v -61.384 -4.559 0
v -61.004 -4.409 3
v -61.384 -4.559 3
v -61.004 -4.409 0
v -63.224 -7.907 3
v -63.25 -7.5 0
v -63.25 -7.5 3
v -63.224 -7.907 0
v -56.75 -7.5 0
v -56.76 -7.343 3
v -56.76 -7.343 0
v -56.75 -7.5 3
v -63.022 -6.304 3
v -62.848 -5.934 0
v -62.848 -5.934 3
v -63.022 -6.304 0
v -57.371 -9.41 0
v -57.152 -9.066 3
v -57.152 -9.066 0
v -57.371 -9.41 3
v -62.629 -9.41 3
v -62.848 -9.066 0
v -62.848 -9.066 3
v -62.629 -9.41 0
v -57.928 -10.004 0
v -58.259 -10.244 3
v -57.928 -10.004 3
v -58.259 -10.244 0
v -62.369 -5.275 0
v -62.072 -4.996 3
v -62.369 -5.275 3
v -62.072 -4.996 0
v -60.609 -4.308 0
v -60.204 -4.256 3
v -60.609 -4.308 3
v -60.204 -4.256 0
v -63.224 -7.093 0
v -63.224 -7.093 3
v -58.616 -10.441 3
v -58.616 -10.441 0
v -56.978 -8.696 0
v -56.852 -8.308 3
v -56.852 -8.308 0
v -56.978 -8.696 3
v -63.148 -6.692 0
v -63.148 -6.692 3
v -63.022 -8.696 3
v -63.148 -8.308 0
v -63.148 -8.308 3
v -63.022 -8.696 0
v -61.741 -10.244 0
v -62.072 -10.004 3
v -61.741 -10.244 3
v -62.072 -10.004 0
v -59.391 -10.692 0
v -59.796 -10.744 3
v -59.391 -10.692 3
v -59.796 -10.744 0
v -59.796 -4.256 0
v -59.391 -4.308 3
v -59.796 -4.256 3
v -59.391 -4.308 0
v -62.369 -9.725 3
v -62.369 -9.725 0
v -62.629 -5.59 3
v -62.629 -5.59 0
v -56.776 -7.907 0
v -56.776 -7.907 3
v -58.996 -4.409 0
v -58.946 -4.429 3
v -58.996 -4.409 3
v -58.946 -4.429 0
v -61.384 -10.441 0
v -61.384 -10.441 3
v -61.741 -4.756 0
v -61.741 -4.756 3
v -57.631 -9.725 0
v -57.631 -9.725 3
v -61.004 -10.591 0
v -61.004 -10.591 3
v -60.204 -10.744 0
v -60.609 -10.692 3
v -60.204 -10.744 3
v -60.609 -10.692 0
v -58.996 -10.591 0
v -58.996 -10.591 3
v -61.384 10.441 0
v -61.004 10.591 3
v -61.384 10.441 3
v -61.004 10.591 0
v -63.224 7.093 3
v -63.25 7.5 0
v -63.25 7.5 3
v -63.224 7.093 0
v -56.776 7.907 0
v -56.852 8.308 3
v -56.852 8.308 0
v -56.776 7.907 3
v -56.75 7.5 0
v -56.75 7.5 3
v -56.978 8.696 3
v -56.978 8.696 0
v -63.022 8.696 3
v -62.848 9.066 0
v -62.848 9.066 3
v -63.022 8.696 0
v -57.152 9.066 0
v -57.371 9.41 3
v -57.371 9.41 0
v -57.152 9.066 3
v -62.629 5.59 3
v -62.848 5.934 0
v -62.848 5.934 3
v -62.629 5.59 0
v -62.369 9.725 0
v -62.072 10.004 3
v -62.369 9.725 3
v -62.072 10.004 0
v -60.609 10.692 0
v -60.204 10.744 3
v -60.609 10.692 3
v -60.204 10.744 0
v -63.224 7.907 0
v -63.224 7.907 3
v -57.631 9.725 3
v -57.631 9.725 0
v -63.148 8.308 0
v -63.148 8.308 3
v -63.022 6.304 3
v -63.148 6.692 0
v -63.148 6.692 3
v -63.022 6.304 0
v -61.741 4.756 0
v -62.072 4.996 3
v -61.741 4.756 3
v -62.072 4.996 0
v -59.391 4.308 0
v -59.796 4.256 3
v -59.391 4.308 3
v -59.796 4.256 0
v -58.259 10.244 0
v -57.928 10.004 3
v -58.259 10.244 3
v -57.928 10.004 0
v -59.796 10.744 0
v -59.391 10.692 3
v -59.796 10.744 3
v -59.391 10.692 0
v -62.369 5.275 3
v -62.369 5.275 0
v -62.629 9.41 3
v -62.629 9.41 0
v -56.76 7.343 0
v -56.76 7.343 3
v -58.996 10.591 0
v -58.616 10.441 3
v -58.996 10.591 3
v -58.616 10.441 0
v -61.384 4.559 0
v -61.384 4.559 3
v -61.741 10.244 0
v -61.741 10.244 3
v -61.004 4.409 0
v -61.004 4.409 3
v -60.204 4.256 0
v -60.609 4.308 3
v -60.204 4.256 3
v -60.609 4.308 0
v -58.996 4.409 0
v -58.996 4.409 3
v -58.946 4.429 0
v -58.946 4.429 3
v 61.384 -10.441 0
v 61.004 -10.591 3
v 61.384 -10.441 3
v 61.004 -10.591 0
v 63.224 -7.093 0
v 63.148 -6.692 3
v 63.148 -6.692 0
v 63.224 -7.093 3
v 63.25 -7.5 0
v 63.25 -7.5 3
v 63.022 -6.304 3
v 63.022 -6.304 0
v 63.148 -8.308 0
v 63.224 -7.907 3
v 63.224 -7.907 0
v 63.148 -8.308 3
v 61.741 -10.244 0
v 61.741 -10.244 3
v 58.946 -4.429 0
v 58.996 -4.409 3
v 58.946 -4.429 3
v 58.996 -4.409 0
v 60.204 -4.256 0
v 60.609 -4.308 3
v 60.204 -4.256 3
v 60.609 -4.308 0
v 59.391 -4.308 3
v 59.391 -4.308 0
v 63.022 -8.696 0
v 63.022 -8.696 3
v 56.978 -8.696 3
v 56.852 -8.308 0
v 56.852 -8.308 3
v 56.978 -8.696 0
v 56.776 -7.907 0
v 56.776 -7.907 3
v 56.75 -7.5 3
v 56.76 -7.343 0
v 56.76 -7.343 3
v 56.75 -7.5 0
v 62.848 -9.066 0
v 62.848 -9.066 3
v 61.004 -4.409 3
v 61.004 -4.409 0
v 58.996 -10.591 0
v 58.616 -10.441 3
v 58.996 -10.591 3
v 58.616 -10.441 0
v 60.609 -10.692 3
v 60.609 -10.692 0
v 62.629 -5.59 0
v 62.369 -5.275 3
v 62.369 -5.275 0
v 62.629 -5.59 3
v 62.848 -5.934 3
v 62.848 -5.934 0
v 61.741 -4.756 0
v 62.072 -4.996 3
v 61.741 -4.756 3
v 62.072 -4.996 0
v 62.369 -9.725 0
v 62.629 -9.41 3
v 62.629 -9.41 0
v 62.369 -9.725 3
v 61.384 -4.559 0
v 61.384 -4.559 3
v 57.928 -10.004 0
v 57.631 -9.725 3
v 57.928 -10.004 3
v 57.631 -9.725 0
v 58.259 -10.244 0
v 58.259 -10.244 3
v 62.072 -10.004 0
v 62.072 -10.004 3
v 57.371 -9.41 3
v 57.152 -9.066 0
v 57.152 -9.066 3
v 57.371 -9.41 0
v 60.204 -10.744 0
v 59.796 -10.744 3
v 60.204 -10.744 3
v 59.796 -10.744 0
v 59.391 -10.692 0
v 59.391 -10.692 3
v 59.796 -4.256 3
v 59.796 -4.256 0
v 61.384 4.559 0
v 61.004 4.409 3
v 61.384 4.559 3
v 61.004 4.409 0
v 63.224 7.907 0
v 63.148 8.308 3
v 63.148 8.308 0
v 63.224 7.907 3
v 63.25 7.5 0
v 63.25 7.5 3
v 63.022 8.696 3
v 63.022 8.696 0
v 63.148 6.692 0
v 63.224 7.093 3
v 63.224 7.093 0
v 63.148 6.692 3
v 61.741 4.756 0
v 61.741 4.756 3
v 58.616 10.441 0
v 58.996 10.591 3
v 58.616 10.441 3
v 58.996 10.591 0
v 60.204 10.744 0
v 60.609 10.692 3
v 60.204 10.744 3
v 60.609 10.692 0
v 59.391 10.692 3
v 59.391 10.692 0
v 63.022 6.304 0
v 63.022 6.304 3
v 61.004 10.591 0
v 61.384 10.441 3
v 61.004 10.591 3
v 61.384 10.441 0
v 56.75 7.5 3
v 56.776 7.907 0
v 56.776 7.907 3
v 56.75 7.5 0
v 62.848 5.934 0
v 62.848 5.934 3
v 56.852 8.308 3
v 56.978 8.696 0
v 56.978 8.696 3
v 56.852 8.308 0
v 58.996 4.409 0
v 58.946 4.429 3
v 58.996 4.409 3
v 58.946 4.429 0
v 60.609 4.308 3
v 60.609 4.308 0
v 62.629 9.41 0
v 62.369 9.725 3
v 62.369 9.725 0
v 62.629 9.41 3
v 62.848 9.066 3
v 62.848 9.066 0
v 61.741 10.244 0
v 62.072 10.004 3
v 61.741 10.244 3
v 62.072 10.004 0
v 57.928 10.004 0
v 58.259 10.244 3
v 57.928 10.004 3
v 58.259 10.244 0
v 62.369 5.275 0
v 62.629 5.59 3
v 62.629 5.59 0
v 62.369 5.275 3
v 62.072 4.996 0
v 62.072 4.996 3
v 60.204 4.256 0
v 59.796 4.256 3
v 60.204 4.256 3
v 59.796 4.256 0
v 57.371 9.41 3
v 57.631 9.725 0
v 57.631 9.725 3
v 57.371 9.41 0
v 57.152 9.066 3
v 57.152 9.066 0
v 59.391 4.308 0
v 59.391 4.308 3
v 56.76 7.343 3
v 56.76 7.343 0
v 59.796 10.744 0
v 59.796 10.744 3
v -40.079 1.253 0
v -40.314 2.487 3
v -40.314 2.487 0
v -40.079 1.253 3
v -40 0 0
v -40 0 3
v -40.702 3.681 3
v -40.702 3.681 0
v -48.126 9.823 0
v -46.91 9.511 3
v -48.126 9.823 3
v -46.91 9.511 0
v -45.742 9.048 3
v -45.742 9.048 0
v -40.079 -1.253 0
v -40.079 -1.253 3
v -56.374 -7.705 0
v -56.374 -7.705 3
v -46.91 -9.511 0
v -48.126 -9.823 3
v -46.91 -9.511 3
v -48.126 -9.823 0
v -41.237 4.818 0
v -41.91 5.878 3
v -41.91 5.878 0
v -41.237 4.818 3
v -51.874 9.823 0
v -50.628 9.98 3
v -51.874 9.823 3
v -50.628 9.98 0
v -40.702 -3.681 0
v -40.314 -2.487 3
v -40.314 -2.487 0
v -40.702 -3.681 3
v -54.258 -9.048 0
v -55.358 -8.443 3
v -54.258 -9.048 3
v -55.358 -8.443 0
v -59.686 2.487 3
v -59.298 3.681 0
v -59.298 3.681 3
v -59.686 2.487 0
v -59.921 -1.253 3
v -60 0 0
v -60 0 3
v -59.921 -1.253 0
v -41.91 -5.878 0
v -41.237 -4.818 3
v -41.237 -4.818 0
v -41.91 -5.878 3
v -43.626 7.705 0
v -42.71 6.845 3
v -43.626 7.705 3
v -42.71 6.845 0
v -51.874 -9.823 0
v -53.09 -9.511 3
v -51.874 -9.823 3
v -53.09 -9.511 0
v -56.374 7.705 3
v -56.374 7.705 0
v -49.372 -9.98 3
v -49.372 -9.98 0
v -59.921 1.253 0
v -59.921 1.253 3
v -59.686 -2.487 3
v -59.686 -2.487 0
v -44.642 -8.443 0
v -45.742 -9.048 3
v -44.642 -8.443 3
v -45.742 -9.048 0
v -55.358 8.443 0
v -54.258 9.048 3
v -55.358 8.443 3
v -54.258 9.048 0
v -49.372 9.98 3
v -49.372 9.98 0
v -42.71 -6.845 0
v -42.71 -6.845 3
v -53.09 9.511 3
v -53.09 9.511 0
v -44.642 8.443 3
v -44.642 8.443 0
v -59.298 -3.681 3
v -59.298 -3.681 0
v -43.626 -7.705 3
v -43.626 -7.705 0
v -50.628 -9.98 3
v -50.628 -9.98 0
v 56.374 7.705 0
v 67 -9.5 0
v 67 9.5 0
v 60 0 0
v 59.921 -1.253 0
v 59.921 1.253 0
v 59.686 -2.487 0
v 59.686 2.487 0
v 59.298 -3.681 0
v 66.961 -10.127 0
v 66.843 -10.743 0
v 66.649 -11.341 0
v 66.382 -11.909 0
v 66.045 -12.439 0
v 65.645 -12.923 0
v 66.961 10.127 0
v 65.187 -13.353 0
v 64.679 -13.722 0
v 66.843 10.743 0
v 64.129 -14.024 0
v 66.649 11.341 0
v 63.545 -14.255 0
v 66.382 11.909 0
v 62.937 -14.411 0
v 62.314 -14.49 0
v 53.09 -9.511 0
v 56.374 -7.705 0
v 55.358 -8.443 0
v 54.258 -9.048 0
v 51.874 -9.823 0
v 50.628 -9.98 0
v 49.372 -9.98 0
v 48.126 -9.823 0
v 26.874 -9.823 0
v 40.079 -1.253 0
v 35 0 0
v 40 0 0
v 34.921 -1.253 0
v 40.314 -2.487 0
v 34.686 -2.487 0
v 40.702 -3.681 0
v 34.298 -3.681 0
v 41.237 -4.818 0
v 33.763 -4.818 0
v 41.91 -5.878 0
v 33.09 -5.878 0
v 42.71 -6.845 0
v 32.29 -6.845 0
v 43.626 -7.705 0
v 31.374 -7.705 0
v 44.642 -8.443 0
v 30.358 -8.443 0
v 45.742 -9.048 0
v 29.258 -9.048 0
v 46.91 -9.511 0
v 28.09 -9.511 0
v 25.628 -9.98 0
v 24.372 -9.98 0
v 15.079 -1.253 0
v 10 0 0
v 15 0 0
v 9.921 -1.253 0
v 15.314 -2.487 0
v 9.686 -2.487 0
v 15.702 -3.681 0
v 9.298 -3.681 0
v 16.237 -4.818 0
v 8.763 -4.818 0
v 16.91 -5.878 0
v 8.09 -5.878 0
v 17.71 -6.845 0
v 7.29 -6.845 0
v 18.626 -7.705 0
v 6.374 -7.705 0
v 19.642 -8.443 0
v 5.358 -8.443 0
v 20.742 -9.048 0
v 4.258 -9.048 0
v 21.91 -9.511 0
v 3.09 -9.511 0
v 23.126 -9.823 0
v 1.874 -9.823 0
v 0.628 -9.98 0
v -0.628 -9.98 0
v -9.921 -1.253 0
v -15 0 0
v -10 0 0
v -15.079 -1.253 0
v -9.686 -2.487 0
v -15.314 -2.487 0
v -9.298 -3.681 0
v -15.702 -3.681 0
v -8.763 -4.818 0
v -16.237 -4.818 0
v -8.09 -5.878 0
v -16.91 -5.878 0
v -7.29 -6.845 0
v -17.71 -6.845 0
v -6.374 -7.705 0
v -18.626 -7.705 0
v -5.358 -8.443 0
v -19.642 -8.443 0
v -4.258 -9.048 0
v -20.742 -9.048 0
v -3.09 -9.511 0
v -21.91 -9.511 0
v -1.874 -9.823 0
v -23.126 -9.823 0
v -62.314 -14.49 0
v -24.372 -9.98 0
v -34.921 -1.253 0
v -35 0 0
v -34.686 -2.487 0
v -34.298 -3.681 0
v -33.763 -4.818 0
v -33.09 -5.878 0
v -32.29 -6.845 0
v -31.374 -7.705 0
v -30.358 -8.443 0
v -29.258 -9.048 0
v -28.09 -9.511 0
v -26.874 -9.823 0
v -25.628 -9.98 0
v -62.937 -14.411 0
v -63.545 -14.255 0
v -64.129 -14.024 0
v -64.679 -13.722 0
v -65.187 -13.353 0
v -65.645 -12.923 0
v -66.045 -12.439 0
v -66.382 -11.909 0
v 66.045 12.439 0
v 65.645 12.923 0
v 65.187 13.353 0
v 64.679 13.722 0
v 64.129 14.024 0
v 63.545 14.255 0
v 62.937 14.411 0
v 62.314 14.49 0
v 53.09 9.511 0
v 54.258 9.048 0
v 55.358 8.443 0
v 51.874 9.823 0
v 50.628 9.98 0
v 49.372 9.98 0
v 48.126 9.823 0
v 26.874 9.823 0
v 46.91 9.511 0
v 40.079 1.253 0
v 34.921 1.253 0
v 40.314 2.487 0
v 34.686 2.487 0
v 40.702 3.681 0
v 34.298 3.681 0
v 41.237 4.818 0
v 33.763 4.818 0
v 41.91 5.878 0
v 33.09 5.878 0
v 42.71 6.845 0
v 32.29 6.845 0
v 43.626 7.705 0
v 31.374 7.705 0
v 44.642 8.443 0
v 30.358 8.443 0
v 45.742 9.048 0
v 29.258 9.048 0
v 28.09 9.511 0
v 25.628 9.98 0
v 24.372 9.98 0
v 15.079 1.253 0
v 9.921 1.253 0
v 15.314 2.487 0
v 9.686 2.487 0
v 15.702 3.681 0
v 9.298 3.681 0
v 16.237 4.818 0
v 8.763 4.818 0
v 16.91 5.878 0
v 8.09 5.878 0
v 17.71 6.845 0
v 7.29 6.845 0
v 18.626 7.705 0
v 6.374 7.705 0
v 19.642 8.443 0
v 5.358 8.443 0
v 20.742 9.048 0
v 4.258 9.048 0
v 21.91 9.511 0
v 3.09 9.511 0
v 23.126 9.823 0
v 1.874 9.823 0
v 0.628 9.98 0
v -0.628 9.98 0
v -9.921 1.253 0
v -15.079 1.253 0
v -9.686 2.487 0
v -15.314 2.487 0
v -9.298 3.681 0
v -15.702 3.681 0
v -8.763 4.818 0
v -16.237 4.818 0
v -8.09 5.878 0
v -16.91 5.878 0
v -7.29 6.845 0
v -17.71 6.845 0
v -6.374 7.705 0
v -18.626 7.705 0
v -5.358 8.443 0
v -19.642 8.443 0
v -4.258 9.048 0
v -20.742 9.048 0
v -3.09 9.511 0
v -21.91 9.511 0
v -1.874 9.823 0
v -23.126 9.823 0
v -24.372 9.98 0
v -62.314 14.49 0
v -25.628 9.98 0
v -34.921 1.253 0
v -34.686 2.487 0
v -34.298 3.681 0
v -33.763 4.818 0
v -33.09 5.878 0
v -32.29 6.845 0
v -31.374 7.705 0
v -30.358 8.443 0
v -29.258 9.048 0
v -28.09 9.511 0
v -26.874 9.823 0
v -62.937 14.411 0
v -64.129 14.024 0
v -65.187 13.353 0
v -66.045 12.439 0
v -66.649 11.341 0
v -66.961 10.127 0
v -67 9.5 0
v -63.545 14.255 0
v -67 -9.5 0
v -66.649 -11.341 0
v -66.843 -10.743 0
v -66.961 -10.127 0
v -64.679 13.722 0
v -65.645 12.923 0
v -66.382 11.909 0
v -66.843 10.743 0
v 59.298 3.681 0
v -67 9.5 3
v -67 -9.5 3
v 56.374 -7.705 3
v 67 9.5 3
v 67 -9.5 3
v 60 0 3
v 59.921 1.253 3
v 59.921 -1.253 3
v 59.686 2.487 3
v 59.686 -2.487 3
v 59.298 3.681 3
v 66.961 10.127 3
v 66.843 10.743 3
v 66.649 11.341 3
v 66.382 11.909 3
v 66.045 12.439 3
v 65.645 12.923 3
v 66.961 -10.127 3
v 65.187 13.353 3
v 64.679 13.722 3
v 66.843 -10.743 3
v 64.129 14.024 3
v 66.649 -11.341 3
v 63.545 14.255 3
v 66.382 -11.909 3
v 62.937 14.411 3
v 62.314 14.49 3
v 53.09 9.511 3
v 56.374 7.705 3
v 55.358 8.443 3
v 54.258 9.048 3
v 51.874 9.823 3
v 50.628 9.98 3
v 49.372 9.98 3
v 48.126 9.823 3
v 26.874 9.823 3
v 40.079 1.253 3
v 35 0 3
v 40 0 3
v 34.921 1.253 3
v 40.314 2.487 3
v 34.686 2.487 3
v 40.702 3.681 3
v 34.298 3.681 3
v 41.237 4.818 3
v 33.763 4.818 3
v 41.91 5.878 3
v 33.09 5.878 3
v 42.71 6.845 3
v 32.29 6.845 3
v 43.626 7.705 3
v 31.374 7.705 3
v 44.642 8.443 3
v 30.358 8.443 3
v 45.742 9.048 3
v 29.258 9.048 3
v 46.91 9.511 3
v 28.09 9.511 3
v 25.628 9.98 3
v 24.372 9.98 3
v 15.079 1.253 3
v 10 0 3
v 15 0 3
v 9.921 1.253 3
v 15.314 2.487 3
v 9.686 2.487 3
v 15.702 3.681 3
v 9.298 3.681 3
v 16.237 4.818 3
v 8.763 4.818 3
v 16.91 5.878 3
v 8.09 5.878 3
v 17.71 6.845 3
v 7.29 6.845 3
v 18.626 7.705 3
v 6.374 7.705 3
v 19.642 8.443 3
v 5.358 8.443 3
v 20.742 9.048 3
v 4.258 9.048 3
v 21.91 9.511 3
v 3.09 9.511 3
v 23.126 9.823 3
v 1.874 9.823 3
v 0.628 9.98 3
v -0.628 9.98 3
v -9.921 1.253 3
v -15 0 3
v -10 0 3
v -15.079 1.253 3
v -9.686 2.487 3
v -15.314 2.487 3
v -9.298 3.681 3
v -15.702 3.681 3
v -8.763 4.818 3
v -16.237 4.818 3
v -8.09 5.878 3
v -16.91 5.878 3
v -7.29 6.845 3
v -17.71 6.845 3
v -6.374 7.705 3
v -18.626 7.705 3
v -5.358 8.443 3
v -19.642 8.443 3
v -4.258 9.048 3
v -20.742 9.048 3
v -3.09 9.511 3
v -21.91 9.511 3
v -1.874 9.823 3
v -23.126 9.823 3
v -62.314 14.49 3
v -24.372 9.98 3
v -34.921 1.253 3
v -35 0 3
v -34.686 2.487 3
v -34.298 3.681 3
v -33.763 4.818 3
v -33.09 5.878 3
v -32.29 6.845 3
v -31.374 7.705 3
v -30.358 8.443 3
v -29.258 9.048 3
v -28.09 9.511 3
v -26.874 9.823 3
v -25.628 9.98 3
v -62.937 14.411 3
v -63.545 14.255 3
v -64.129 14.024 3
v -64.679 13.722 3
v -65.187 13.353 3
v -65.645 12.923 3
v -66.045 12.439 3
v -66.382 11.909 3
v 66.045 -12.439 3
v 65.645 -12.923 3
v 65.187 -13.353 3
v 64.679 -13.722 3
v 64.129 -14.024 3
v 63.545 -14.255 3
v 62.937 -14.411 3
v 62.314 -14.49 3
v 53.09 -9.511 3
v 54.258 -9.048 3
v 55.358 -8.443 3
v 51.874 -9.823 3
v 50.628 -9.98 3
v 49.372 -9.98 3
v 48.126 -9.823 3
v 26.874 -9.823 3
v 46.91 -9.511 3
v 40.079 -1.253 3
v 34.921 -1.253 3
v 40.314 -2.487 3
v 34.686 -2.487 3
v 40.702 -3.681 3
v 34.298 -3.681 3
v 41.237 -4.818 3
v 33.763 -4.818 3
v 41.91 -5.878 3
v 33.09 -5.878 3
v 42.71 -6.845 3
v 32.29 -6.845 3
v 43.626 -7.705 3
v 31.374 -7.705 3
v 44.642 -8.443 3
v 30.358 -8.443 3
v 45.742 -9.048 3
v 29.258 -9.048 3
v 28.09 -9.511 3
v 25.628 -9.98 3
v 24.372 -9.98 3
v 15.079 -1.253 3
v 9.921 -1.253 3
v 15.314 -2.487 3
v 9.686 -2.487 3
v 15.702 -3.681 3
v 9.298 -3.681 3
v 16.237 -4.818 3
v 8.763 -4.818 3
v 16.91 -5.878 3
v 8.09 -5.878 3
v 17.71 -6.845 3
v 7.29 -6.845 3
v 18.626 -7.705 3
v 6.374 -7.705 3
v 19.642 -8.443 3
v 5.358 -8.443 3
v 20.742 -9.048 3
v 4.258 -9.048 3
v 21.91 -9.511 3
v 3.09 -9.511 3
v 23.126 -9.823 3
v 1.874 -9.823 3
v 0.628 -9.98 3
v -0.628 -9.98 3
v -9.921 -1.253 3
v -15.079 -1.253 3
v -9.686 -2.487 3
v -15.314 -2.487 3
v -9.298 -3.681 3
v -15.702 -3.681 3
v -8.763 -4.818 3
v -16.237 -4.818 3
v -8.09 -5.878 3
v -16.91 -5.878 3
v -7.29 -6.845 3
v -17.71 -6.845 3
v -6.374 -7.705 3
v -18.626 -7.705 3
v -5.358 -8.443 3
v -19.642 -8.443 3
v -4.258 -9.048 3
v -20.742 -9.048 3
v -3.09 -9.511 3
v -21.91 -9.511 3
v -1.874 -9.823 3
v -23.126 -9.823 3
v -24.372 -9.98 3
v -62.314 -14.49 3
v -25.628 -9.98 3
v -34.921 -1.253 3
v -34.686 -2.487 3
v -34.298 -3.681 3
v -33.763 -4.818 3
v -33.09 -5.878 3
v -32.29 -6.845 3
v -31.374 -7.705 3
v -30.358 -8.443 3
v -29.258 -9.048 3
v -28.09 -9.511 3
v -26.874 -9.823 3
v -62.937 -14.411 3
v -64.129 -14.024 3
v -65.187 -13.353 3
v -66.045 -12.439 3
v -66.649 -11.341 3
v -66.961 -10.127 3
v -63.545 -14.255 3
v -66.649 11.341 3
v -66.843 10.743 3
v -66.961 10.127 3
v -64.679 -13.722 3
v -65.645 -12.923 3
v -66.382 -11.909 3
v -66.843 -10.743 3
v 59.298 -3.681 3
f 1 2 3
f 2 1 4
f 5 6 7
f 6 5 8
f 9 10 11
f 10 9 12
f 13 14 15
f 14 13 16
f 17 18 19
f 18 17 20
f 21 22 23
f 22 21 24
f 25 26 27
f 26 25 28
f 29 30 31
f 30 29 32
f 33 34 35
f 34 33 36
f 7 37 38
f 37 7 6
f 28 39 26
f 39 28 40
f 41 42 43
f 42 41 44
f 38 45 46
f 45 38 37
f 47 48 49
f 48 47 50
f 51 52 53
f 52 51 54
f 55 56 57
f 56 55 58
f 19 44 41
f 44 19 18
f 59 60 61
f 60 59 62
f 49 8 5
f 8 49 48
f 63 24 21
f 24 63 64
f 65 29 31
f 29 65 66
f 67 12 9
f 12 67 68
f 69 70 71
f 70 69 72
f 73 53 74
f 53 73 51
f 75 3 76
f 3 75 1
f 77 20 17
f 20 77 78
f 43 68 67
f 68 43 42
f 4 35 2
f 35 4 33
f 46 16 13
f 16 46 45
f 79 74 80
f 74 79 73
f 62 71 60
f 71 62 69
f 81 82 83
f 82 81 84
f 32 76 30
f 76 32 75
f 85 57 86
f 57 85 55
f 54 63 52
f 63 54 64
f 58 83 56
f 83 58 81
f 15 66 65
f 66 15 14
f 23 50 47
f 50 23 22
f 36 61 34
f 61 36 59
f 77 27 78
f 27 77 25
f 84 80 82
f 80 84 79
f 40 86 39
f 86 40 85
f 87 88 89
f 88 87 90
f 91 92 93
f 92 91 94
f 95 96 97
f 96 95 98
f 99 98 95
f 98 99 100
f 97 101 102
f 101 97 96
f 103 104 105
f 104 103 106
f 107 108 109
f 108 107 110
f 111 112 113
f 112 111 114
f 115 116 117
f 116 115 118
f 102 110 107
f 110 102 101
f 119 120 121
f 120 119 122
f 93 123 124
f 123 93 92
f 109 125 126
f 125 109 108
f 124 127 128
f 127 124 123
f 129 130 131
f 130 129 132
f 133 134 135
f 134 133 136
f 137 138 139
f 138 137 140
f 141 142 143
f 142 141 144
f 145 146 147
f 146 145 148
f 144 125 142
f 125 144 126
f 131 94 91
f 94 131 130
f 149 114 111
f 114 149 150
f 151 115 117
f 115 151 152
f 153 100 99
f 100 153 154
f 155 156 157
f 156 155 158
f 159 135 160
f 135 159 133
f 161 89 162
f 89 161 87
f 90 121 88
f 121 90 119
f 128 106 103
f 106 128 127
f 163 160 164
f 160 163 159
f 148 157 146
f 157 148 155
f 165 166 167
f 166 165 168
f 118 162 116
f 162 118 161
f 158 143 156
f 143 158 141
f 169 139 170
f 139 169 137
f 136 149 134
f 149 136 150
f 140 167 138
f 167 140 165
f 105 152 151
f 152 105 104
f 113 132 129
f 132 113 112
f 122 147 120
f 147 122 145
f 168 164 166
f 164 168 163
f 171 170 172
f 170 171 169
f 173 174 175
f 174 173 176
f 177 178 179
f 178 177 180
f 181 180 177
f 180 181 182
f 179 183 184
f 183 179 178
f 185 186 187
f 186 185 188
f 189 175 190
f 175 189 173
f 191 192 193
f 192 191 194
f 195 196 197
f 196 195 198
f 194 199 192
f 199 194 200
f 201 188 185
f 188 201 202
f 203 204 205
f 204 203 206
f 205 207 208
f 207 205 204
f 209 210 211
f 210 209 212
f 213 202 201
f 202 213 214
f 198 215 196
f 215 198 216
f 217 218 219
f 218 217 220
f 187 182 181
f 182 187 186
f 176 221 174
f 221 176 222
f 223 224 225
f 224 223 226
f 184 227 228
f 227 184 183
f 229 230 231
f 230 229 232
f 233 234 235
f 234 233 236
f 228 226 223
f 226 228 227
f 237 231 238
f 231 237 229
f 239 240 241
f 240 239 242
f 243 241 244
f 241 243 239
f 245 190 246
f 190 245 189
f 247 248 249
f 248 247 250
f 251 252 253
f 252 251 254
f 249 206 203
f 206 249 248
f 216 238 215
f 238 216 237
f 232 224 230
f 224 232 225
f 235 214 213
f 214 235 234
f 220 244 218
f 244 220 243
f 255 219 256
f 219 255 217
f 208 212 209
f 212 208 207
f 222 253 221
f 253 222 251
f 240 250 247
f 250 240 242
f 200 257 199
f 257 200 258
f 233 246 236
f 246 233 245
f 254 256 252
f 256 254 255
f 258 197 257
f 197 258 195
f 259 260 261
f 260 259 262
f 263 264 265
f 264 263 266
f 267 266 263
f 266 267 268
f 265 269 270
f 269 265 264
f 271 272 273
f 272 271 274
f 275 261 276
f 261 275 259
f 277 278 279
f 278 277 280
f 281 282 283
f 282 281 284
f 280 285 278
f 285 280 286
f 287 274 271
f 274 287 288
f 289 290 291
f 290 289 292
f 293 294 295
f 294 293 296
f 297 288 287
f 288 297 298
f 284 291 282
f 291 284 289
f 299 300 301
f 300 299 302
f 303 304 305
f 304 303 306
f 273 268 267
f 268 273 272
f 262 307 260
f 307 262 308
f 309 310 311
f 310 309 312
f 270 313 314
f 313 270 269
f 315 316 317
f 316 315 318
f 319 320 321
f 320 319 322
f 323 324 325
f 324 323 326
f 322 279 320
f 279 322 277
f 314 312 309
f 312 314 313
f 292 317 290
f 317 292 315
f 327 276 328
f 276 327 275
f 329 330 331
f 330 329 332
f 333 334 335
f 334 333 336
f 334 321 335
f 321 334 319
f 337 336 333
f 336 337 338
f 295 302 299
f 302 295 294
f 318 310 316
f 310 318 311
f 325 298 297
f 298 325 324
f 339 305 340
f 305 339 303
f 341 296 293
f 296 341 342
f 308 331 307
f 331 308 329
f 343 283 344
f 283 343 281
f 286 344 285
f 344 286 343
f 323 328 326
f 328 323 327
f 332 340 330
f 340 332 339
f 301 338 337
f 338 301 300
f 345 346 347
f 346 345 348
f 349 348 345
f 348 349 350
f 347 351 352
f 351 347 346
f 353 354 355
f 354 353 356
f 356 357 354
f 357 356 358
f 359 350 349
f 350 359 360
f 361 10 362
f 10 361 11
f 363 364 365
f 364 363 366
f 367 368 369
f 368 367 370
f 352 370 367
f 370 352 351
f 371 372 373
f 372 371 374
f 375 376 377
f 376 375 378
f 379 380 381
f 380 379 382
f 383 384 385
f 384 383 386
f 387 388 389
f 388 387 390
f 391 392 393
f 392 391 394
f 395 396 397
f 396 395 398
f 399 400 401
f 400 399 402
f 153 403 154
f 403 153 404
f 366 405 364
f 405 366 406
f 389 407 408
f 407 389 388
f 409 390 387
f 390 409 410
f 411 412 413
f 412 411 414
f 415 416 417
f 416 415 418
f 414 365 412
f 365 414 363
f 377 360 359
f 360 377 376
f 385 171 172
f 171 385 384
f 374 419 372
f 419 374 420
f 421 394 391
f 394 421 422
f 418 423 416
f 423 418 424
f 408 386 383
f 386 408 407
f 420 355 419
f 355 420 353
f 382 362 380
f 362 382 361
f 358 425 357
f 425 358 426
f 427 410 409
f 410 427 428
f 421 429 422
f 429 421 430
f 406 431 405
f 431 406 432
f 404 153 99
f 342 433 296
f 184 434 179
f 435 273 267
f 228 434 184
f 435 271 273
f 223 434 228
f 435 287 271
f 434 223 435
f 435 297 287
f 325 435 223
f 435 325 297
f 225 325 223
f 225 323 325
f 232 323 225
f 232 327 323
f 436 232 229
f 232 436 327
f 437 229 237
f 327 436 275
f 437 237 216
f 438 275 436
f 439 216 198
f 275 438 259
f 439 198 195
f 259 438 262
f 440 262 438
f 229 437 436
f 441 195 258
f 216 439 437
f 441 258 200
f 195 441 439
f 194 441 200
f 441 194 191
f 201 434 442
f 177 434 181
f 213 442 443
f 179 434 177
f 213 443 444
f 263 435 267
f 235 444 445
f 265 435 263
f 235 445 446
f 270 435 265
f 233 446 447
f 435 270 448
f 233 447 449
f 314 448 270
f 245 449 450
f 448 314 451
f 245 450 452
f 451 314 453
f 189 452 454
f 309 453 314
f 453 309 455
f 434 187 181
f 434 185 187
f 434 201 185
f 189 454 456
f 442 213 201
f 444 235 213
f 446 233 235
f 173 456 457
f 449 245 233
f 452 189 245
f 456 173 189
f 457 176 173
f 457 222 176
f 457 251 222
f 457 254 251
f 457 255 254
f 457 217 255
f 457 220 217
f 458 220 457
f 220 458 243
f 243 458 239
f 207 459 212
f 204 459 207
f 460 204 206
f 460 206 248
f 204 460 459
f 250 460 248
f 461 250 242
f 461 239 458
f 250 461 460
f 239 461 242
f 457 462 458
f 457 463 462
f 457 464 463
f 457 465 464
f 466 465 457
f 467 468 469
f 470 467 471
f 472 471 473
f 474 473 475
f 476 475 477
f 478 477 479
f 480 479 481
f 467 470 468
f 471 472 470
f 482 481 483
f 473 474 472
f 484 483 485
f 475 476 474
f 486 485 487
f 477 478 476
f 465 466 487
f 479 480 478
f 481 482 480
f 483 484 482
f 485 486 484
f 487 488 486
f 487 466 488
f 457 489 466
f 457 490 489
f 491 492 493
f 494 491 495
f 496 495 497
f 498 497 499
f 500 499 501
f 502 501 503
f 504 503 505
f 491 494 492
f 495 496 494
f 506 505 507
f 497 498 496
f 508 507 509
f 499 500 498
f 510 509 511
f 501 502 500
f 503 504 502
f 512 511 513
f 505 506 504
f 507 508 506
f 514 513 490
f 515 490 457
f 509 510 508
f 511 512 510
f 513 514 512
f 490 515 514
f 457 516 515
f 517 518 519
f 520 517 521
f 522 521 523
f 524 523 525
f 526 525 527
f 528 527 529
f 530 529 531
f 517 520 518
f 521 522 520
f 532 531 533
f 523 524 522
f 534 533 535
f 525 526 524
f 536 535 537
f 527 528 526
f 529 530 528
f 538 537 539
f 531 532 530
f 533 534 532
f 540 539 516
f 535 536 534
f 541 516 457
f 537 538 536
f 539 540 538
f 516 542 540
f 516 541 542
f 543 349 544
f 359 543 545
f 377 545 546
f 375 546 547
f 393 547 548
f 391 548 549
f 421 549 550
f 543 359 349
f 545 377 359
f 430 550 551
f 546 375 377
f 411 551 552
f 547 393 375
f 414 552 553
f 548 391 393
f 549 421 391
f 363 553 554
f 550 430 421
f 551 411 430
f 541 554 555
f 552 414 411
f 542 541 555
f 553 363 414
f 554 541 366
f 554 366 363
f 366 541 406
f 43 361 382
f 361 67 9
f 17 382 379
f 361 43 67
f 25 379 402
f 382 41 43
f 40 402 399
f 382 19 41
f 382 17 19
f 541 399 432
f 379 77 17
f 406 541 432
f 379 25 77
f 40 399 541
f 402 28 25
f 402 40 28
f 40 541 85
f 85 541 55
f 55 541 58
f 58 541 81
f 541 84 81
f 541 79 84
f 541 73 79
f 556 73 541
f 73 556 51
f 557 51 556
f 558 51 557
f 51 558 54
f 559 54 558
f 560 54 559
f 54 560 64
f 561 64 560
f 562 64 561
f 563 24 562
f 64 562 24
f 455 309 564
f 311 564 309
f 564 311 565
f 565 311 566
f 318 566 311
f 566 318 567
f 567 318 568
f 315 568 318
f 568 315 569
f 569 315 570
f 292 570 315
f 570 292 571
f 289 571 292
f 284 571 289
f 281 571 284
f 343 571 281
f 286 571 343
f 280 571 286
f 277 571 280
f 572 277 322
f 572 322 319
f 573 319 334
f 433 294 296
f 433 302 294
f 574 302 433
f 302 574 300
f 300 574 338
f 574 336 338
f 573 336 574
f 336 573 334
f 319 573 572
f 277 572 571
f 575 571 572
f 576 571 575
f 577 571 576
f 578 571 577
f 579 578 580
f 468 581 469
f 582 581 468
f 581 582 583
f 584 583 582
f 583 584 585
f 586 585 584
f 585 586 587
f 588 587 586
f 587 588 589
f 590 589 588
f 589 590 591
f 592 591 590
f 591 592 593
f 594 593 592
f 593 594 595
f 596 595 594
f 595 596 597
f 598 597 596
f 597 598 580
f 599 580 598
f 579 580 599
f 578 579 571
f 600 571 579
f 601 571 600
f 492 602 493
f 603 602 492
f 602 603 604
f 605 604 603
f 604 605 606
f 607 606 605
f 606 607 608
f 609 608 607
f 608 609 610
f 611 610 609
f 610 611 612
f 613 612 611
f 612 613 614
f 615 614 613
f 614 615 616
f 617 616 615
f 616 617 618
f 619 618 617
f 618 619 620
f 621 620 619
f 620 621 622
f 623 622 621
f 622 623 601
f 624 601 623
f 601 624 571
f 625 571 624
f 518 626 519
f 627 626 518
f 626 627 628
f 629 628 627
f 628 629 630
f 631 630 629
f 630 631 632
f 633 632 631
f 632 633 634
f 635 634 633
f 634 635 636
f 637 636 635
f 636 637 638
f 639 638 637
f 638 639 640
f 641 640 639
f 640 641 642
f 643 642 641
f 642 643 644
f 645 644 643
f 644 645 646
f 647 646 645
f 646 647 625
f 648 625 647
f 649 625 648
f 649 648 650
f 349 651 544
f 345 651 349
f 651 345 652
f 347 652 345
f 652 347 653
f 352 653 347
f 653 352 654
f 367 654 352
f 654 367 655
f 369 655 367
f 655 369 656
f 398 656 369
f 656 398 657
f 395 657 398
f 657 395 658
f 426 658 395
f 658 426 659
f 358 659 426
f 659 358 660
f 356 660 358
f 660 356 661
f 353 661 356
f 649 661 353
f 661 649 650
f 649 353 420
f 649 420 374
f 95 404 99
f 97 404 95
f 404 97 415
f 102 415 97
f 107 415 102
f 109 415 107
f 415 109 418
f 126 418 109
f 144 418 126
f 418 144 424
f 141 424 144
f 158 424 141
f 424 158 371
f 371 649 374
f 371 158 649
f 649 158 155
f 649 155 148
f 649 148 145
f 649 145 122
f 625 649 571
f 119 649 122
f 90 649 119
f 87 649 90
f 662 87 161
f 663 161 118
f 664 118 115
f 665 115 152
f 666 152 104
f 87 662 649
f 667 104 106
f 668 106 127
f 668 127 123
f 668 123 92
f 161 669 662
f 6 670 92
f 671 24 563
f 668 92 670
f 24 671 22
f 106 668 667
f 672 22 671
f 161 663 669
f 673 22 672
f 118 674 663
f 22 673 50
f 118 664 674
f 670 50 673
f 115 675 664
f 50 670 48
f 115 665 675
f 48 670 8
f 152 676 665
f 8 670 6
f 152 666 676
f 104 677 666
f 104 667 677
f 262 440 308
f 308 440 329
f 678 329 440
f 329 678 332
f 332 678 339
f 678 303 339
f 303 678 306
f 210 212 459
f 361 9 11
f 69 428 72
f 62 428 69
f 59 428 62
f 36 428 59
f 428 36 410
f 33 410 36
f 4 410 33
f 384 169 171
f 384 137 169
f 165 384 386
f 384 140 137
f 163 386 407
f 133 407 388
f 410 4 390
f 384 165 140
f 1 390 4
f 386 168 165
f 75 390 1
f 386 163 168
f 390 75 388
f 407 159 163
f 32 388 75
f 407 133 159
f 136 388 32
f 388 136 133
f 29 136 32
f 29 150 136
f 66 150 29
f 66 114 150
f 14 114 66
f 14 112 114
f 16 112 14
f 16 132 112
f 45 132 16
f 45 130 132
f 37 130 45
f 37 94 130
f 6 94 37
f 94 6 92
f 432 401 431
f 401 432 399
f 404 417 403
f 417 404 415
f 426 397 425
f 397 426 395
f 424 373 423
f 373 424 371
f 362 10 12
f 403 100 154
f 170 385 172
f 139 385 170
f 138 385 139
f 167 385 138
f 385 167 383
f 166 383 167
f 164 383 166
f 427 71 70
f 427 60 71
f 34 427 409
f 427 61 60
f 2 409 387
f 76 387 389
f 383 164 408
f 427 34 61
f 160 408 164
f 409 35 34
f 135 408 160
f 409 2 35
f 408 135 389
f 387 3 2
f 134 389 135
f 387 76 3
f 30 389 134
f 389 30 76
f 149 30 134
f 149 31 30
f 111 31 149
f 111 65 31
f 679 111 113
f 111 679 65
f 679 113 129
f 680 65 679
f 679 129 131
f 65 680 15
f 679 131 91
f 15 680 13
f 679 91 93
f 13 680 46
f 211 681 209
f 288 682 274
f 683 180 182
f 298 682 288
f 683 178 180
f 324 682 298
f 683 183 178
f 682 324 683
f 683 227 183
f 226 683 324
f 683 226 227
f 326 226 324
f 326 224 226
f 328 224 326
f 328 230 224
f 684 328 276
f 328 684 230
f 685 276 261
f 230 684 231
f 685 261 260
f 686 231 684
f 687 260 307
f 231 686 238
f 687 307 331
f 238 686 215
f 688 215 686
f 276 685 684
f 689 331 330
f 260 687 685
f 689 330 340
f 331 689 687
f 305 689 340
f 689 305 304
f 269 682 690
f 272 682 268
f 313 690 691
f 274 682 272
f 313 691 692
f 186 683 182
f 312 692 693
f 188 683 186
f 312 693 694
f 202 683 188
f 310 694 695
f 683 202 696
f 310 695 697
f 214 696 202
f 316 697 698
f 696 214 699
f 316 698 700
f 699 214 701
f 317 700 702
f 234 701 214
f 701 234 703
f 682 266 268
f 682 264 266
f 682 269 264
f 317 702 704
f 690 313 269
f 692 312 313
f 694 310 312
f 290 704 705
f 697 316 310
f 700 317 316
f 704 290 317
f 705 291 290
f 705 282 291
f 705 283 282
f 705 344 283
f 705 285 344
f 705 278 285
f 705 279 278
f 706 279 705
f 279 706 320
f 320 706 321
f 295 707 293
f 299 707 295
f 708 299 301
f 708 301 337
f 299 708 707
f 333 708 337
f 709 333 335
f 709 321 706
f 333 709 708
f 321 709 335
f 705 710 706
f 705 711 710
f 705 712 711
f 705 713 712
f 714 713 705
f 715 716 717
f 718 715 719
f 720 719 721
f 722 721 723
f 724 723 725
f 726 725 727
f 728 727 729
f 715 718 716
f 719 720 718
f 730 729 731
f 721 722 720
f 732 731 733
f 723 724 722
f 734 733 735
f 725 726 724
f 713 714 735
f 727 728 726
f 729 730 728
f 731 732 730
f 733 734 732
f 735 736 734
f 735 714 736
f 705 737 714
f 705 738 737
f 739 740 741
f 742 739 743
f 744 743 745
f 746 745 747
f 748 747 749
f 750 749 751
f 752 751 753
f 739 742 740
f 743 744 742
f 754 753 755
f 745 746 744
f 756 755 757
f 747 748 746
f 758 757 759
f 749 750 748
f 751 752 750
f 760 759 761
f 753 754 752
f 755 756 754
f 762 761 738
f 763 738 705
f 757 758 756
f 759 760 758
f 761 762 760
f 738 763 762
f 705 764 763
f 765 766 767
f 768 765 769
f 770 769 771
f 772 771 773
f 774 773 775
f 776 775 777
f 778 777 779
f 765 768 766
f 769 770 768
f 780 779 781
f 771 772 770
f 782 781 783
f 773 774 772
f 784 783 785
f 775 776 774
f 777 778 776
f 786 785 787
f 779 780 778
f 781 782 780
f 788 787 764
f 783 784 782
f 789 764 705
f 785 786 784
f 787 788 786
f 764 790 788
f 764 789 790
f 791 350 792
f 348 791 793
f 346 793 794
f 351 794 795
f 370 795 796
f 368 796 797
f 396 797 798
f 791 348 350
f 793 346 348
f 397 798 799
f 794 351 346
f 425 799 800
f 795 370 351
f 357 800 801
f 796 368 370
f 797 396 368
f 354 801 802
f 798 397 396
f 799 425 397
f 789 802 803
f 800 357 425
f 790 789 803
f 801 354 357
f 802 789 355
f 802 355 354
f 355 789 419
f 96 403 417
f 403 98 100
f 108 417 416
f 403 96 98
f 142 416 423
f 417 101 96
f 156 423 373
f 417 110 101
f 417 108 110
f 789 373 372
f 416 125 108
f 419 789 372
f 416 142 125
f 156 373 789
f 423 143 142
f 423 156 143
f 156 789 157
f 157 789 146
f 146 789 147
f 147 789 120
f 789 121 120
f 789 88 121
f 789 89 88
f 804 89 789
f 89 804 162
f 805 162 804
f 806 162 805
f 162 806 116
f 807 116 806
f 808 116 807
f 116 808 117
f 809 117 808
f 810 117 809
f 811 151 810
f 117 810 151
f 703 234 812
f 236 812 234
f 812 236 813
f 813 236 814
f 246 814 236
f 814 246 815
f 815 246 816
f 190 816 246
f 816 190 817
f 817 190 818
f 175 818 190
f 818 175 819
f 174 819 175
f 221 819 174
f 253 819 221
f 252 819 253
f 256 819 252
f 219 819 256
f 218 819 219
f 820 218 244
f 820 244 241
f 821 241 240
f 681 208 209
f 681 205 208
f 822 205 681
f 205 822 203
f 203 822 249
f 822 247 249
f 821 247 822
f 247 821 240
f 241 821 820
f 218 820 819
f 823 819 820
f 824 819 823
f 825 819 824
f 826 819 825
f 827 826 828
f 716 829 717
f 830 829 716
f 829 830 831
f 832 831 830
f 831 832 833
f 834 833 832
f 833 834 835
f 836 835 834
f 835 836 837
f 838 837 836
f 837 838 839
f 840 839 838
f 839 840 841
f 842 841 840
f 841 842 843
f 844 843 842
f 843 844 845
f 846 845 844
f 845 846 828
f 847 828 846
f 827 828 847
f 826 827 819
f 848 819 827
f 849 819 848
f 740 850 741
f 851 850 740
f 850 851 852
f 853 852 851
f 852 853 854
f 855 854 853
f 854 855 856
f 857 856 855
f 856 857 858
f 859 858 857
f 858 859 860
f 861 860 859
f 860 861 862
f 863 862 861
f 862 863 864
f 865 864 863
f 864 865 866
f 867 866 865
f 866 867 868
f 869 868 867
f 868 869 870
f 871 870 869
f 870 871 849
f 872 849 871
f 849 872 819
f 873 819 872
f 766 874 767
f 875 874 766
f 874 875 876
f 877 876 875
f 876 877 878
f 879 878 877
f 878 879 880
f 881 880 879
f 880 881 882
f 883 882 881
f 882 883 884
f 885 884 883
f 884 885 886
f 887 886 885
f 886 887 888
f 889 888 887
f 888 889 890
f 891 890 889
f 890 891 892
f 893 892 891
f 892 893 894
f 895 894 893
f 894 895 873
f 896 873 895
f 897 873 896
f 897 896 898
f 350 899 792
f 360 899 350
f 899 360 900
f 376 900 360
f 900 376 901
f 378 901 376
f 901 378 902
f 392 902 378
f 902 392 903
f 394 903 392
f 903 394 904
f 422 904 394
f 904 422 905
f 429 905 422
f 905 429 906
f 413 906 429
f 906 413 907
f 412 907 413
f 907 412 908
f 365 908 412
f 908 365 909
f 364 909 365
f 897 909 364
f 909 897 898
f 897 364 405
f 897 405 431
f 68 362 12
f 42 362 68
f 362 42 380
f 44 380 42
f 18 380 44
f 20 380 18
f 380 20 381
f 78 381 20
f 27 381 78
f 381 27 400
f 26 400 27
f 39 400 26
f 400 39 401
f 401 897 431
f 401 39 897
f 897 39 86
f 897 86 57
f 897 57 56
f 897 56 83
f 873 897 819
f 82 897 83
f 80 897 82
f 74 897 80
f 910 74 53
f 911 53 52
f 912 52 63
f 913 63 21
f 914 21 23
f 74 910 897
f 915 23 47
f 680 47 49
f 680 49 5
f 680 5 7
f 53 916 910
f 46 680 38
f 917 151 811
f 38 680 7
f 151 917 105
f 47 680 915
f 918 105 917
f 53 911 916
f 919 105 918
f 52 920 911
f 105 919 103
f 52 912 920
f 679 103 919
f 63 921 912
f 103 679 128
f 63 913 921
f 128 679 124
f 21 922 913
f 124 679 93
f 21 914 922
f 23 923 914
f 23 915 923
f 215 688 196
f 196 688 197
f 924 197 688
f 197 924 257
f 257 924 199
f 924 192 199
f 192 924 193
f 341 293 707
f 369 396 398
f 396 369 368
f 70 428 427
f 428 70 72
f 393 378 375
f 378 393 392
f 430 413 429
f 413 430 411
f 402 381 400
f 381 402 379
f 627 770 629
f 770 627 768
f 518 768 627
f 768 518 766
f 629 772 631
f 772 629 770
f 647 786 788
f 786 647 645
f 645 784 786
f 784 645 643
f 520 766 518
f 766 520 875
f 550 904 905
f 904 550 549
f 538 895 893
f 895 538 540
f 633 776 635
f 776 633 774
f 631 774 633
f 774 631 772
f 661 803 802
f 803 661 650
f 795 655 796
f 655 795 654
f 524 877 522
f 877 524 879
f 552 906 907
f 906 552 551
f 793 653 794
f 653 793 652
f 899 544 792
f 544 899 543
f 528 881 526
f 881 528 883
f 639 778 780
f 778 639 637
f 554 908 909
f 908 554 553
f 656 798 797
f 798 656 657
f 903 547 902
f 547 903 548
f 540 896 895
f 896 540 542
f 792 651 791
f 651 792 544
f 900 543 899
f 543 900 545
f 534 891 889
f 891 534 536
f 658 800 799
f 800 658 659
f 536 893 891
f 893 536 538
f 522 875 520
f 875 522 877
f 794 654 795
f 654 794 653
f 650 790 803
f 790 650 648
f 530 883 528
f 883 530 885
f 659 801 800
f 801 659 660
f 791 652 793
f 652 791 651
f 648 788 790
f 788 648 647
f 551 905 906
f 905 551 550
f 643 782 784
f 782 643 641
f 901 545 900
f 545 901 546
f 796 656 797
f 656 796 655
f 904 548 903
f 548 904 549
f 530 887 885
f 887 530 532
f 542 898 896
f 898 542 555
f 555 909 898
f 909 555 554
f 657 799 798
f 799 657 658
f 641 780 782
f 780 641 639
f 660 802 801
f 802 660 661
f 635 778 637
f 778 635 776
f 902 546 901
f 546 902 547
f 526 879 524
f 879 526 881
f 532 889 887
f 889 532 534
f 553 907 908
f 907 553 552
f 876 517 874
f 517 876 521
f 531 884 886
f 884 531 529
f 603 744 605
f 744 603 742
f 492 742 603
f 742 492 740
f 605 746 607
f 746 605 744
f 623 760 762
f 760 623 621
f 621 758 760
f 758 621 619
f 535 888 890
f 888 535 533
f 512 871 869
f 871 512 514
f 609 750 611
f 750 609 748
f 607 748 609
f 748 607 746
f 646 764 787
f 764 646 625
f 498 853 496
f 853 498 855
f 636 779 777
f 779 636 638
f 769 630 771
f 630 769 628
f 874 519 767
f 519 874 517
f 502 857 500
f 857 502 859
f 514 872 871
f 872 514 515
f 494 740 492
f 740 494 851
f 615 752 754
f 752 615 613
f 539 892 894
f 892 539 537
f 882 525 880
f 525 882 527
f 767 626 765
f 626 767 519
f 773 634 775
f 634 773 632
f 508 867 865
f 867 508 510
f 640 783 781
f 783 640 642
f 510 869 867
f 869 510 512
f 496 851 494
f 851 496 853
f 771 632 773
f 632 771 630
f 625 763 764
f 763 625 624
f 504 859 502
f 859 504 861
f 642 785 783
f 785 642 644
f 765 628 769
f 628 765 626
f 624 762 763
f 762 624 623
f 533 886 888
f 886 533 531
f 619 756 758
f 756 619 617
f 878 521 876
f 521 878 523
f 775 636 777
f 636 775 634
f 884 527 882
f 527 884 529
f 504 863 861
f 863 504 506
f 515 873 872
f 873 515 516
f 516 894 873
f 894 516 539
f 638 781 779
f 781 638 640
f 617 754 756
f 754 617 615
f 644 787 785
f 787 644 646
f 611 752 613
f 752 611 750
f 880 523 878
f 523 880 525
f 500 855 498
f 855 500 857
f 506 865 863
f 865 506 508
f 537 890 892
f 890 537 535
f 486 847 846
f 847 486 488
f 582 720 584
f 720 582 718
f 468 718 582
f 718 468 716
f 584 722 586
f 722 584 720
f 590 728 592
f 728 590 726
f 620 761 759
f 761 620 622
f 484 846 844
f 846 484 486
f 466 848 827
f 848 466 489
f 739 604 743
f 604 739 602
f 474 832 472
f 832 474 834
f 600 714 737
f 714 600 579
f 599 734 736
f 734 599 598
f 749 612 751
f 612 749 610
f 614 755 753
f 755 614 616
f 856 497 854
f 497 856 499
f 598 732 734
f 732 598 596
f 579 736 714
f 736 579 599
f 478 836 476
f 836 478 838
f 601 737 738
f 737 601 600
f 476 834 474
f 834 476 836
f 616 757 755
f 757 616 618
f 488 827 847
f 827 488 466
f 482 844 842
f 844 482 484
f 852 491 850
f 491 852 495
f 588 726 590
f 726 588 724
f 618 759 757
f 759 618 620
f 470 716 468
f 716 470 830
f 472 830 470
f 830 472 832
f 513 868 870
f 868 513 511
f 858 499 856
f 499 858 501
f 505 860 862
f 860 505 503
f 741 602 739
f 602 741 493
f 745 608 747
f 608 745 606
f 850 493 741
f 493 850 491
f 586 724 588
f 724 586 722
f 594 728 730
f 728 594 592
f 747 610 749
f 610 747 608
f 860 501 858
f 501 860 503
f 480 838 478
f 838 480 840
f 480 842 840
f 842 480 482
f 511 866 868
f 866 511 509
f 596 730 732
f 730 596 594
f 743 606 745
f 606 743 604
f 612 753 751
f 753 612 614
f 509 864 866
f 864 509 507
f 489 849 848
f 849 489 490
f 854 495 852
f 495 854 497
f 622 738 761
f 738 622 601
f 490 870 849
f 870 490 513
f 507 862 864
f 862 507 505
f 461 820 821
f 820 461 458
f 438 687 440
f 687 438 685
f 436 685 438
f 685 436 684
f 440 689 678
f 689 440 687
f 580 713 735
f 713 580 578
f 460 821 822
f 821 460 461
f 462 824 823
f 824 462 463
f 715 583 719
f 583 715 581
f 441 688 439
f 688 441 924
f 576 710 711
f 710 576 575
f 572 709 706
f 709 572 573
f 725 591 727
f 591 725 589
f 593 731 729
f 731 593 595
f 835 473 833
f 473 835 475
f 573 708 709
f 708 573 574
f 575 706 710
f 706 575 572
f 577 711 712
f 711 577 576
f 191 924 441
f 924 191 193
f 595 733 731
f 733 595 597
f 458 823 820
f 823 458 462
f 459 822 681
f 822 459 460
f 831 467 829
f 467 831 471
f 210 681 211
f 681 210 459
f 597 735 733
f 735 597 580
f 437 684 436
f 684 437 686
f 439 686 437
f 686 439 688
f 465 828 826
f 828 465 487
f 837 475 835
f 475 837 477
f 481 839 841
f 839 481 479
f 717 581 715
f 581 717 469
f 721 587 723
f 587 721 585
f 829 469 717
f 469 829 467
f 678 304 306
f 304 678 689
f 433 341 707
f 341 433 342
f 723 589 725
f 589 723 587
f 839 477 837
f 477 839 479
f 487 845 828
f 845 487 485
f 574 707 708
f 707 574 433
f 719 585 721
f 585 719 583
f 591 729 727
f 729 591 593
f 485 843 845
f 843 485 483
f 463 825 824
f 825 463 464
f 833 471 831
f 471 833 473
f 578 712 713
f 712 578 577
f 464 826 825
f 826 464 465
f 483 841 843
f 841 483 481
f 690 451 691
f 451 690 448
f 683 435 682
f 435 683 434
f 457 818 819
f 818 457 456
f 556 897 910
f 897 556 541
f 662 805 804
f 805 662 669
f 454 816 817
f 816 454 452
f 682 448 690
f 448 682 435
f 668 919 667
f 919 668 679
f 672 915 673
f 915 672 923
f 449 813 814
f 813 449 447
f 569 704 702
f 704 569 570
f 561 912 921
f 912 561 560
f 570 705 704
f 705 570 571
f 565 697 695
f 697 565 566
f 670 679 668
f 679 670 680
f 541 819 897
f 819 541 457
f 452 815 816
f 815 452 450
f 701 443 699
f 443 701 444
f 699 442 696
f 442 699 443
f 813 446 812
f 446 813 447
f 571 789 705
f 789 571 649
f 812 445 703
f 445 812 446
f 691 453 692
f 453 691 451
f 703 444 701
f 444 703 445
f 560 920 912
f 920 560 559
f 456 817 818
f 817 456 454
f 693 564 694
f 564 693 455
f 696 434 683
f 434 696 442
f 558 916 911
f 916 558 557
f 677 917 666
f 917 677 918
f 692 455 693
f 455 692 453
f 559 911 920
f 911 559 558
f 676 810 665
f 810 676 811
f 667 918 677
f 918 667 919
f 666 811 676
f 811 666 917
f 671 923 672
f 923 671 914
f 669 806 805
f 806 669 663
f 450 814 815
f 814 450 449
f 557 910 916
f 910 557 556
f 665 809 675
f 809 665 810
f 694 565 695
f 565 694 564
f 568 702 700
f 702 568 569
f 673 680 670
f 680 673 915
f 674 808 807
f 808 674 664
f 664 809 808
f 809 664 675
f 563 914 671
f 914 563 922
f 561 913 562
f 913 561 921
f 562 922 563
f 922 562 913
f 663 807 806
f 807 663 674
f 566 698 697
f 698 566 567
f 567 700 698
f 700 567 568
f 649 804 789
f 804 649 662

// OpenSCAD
$fn = 50;


difference() {
	union() {
		hull() {
			translate(v = [-62.0000000000, 9.5000000000, 0]) {
				cylinder(h = 3, r = 5);
			}
			translate(v = [62.0000000000, 9.5000000000, 0]) {
				cylinder(h = 3, r = 5);
			}
			translate(v = [-62.0000000000, -9.5000000000, 0]) {
				cylinder(h = 3, r = 5);
			}
			translate(v = [62.0000000000, -9.5000000000, 0]) {
				cylinder(h = 3, r = 5);
			}
		}
	}
	union() {
		#translate(v = [-60.0000000000, -7.5000000000, -100.0000000000]) {
			cylinder(h = 200, r = 3.2500000000);
		}
		#translate(v = [-60.0000000000, 7.5000000000, -100.0000000000]) {
			cylinder(h = 200, r = 3.2500000000);
		}
		#translate(v = [60.0000000000, -7.5000000000, -100.0000000000]) {
			cylinder(h = 200, r = 3.2500000000);
		}
		#translate(v = [60.0000000000, 7.5000000000, -100.0000000000]) {
			cylinder(h = 200, r = 3.2500000000);
		}
		#translate(v = [-50.0000000000, 0, 0]) {
			cylinder(h = 3, r = 10.0000000000);
		}
		#translate(v = [-25.0000000000, 0, 0]) {
			cylinder(h = 3, r = 10.0000000000);
		}
		#cylinder(h = 3, r = 10.0000000000);
		#translate(v = [25.0000000000, 0, 0]) {
			cylinder(h = 3, r = 10.0000000000);
		}
		#translate(v = [50.0000000000, 0, 0]) {
			cylinder(h = 3, r = 10.0000000000);
		}
	}
}
